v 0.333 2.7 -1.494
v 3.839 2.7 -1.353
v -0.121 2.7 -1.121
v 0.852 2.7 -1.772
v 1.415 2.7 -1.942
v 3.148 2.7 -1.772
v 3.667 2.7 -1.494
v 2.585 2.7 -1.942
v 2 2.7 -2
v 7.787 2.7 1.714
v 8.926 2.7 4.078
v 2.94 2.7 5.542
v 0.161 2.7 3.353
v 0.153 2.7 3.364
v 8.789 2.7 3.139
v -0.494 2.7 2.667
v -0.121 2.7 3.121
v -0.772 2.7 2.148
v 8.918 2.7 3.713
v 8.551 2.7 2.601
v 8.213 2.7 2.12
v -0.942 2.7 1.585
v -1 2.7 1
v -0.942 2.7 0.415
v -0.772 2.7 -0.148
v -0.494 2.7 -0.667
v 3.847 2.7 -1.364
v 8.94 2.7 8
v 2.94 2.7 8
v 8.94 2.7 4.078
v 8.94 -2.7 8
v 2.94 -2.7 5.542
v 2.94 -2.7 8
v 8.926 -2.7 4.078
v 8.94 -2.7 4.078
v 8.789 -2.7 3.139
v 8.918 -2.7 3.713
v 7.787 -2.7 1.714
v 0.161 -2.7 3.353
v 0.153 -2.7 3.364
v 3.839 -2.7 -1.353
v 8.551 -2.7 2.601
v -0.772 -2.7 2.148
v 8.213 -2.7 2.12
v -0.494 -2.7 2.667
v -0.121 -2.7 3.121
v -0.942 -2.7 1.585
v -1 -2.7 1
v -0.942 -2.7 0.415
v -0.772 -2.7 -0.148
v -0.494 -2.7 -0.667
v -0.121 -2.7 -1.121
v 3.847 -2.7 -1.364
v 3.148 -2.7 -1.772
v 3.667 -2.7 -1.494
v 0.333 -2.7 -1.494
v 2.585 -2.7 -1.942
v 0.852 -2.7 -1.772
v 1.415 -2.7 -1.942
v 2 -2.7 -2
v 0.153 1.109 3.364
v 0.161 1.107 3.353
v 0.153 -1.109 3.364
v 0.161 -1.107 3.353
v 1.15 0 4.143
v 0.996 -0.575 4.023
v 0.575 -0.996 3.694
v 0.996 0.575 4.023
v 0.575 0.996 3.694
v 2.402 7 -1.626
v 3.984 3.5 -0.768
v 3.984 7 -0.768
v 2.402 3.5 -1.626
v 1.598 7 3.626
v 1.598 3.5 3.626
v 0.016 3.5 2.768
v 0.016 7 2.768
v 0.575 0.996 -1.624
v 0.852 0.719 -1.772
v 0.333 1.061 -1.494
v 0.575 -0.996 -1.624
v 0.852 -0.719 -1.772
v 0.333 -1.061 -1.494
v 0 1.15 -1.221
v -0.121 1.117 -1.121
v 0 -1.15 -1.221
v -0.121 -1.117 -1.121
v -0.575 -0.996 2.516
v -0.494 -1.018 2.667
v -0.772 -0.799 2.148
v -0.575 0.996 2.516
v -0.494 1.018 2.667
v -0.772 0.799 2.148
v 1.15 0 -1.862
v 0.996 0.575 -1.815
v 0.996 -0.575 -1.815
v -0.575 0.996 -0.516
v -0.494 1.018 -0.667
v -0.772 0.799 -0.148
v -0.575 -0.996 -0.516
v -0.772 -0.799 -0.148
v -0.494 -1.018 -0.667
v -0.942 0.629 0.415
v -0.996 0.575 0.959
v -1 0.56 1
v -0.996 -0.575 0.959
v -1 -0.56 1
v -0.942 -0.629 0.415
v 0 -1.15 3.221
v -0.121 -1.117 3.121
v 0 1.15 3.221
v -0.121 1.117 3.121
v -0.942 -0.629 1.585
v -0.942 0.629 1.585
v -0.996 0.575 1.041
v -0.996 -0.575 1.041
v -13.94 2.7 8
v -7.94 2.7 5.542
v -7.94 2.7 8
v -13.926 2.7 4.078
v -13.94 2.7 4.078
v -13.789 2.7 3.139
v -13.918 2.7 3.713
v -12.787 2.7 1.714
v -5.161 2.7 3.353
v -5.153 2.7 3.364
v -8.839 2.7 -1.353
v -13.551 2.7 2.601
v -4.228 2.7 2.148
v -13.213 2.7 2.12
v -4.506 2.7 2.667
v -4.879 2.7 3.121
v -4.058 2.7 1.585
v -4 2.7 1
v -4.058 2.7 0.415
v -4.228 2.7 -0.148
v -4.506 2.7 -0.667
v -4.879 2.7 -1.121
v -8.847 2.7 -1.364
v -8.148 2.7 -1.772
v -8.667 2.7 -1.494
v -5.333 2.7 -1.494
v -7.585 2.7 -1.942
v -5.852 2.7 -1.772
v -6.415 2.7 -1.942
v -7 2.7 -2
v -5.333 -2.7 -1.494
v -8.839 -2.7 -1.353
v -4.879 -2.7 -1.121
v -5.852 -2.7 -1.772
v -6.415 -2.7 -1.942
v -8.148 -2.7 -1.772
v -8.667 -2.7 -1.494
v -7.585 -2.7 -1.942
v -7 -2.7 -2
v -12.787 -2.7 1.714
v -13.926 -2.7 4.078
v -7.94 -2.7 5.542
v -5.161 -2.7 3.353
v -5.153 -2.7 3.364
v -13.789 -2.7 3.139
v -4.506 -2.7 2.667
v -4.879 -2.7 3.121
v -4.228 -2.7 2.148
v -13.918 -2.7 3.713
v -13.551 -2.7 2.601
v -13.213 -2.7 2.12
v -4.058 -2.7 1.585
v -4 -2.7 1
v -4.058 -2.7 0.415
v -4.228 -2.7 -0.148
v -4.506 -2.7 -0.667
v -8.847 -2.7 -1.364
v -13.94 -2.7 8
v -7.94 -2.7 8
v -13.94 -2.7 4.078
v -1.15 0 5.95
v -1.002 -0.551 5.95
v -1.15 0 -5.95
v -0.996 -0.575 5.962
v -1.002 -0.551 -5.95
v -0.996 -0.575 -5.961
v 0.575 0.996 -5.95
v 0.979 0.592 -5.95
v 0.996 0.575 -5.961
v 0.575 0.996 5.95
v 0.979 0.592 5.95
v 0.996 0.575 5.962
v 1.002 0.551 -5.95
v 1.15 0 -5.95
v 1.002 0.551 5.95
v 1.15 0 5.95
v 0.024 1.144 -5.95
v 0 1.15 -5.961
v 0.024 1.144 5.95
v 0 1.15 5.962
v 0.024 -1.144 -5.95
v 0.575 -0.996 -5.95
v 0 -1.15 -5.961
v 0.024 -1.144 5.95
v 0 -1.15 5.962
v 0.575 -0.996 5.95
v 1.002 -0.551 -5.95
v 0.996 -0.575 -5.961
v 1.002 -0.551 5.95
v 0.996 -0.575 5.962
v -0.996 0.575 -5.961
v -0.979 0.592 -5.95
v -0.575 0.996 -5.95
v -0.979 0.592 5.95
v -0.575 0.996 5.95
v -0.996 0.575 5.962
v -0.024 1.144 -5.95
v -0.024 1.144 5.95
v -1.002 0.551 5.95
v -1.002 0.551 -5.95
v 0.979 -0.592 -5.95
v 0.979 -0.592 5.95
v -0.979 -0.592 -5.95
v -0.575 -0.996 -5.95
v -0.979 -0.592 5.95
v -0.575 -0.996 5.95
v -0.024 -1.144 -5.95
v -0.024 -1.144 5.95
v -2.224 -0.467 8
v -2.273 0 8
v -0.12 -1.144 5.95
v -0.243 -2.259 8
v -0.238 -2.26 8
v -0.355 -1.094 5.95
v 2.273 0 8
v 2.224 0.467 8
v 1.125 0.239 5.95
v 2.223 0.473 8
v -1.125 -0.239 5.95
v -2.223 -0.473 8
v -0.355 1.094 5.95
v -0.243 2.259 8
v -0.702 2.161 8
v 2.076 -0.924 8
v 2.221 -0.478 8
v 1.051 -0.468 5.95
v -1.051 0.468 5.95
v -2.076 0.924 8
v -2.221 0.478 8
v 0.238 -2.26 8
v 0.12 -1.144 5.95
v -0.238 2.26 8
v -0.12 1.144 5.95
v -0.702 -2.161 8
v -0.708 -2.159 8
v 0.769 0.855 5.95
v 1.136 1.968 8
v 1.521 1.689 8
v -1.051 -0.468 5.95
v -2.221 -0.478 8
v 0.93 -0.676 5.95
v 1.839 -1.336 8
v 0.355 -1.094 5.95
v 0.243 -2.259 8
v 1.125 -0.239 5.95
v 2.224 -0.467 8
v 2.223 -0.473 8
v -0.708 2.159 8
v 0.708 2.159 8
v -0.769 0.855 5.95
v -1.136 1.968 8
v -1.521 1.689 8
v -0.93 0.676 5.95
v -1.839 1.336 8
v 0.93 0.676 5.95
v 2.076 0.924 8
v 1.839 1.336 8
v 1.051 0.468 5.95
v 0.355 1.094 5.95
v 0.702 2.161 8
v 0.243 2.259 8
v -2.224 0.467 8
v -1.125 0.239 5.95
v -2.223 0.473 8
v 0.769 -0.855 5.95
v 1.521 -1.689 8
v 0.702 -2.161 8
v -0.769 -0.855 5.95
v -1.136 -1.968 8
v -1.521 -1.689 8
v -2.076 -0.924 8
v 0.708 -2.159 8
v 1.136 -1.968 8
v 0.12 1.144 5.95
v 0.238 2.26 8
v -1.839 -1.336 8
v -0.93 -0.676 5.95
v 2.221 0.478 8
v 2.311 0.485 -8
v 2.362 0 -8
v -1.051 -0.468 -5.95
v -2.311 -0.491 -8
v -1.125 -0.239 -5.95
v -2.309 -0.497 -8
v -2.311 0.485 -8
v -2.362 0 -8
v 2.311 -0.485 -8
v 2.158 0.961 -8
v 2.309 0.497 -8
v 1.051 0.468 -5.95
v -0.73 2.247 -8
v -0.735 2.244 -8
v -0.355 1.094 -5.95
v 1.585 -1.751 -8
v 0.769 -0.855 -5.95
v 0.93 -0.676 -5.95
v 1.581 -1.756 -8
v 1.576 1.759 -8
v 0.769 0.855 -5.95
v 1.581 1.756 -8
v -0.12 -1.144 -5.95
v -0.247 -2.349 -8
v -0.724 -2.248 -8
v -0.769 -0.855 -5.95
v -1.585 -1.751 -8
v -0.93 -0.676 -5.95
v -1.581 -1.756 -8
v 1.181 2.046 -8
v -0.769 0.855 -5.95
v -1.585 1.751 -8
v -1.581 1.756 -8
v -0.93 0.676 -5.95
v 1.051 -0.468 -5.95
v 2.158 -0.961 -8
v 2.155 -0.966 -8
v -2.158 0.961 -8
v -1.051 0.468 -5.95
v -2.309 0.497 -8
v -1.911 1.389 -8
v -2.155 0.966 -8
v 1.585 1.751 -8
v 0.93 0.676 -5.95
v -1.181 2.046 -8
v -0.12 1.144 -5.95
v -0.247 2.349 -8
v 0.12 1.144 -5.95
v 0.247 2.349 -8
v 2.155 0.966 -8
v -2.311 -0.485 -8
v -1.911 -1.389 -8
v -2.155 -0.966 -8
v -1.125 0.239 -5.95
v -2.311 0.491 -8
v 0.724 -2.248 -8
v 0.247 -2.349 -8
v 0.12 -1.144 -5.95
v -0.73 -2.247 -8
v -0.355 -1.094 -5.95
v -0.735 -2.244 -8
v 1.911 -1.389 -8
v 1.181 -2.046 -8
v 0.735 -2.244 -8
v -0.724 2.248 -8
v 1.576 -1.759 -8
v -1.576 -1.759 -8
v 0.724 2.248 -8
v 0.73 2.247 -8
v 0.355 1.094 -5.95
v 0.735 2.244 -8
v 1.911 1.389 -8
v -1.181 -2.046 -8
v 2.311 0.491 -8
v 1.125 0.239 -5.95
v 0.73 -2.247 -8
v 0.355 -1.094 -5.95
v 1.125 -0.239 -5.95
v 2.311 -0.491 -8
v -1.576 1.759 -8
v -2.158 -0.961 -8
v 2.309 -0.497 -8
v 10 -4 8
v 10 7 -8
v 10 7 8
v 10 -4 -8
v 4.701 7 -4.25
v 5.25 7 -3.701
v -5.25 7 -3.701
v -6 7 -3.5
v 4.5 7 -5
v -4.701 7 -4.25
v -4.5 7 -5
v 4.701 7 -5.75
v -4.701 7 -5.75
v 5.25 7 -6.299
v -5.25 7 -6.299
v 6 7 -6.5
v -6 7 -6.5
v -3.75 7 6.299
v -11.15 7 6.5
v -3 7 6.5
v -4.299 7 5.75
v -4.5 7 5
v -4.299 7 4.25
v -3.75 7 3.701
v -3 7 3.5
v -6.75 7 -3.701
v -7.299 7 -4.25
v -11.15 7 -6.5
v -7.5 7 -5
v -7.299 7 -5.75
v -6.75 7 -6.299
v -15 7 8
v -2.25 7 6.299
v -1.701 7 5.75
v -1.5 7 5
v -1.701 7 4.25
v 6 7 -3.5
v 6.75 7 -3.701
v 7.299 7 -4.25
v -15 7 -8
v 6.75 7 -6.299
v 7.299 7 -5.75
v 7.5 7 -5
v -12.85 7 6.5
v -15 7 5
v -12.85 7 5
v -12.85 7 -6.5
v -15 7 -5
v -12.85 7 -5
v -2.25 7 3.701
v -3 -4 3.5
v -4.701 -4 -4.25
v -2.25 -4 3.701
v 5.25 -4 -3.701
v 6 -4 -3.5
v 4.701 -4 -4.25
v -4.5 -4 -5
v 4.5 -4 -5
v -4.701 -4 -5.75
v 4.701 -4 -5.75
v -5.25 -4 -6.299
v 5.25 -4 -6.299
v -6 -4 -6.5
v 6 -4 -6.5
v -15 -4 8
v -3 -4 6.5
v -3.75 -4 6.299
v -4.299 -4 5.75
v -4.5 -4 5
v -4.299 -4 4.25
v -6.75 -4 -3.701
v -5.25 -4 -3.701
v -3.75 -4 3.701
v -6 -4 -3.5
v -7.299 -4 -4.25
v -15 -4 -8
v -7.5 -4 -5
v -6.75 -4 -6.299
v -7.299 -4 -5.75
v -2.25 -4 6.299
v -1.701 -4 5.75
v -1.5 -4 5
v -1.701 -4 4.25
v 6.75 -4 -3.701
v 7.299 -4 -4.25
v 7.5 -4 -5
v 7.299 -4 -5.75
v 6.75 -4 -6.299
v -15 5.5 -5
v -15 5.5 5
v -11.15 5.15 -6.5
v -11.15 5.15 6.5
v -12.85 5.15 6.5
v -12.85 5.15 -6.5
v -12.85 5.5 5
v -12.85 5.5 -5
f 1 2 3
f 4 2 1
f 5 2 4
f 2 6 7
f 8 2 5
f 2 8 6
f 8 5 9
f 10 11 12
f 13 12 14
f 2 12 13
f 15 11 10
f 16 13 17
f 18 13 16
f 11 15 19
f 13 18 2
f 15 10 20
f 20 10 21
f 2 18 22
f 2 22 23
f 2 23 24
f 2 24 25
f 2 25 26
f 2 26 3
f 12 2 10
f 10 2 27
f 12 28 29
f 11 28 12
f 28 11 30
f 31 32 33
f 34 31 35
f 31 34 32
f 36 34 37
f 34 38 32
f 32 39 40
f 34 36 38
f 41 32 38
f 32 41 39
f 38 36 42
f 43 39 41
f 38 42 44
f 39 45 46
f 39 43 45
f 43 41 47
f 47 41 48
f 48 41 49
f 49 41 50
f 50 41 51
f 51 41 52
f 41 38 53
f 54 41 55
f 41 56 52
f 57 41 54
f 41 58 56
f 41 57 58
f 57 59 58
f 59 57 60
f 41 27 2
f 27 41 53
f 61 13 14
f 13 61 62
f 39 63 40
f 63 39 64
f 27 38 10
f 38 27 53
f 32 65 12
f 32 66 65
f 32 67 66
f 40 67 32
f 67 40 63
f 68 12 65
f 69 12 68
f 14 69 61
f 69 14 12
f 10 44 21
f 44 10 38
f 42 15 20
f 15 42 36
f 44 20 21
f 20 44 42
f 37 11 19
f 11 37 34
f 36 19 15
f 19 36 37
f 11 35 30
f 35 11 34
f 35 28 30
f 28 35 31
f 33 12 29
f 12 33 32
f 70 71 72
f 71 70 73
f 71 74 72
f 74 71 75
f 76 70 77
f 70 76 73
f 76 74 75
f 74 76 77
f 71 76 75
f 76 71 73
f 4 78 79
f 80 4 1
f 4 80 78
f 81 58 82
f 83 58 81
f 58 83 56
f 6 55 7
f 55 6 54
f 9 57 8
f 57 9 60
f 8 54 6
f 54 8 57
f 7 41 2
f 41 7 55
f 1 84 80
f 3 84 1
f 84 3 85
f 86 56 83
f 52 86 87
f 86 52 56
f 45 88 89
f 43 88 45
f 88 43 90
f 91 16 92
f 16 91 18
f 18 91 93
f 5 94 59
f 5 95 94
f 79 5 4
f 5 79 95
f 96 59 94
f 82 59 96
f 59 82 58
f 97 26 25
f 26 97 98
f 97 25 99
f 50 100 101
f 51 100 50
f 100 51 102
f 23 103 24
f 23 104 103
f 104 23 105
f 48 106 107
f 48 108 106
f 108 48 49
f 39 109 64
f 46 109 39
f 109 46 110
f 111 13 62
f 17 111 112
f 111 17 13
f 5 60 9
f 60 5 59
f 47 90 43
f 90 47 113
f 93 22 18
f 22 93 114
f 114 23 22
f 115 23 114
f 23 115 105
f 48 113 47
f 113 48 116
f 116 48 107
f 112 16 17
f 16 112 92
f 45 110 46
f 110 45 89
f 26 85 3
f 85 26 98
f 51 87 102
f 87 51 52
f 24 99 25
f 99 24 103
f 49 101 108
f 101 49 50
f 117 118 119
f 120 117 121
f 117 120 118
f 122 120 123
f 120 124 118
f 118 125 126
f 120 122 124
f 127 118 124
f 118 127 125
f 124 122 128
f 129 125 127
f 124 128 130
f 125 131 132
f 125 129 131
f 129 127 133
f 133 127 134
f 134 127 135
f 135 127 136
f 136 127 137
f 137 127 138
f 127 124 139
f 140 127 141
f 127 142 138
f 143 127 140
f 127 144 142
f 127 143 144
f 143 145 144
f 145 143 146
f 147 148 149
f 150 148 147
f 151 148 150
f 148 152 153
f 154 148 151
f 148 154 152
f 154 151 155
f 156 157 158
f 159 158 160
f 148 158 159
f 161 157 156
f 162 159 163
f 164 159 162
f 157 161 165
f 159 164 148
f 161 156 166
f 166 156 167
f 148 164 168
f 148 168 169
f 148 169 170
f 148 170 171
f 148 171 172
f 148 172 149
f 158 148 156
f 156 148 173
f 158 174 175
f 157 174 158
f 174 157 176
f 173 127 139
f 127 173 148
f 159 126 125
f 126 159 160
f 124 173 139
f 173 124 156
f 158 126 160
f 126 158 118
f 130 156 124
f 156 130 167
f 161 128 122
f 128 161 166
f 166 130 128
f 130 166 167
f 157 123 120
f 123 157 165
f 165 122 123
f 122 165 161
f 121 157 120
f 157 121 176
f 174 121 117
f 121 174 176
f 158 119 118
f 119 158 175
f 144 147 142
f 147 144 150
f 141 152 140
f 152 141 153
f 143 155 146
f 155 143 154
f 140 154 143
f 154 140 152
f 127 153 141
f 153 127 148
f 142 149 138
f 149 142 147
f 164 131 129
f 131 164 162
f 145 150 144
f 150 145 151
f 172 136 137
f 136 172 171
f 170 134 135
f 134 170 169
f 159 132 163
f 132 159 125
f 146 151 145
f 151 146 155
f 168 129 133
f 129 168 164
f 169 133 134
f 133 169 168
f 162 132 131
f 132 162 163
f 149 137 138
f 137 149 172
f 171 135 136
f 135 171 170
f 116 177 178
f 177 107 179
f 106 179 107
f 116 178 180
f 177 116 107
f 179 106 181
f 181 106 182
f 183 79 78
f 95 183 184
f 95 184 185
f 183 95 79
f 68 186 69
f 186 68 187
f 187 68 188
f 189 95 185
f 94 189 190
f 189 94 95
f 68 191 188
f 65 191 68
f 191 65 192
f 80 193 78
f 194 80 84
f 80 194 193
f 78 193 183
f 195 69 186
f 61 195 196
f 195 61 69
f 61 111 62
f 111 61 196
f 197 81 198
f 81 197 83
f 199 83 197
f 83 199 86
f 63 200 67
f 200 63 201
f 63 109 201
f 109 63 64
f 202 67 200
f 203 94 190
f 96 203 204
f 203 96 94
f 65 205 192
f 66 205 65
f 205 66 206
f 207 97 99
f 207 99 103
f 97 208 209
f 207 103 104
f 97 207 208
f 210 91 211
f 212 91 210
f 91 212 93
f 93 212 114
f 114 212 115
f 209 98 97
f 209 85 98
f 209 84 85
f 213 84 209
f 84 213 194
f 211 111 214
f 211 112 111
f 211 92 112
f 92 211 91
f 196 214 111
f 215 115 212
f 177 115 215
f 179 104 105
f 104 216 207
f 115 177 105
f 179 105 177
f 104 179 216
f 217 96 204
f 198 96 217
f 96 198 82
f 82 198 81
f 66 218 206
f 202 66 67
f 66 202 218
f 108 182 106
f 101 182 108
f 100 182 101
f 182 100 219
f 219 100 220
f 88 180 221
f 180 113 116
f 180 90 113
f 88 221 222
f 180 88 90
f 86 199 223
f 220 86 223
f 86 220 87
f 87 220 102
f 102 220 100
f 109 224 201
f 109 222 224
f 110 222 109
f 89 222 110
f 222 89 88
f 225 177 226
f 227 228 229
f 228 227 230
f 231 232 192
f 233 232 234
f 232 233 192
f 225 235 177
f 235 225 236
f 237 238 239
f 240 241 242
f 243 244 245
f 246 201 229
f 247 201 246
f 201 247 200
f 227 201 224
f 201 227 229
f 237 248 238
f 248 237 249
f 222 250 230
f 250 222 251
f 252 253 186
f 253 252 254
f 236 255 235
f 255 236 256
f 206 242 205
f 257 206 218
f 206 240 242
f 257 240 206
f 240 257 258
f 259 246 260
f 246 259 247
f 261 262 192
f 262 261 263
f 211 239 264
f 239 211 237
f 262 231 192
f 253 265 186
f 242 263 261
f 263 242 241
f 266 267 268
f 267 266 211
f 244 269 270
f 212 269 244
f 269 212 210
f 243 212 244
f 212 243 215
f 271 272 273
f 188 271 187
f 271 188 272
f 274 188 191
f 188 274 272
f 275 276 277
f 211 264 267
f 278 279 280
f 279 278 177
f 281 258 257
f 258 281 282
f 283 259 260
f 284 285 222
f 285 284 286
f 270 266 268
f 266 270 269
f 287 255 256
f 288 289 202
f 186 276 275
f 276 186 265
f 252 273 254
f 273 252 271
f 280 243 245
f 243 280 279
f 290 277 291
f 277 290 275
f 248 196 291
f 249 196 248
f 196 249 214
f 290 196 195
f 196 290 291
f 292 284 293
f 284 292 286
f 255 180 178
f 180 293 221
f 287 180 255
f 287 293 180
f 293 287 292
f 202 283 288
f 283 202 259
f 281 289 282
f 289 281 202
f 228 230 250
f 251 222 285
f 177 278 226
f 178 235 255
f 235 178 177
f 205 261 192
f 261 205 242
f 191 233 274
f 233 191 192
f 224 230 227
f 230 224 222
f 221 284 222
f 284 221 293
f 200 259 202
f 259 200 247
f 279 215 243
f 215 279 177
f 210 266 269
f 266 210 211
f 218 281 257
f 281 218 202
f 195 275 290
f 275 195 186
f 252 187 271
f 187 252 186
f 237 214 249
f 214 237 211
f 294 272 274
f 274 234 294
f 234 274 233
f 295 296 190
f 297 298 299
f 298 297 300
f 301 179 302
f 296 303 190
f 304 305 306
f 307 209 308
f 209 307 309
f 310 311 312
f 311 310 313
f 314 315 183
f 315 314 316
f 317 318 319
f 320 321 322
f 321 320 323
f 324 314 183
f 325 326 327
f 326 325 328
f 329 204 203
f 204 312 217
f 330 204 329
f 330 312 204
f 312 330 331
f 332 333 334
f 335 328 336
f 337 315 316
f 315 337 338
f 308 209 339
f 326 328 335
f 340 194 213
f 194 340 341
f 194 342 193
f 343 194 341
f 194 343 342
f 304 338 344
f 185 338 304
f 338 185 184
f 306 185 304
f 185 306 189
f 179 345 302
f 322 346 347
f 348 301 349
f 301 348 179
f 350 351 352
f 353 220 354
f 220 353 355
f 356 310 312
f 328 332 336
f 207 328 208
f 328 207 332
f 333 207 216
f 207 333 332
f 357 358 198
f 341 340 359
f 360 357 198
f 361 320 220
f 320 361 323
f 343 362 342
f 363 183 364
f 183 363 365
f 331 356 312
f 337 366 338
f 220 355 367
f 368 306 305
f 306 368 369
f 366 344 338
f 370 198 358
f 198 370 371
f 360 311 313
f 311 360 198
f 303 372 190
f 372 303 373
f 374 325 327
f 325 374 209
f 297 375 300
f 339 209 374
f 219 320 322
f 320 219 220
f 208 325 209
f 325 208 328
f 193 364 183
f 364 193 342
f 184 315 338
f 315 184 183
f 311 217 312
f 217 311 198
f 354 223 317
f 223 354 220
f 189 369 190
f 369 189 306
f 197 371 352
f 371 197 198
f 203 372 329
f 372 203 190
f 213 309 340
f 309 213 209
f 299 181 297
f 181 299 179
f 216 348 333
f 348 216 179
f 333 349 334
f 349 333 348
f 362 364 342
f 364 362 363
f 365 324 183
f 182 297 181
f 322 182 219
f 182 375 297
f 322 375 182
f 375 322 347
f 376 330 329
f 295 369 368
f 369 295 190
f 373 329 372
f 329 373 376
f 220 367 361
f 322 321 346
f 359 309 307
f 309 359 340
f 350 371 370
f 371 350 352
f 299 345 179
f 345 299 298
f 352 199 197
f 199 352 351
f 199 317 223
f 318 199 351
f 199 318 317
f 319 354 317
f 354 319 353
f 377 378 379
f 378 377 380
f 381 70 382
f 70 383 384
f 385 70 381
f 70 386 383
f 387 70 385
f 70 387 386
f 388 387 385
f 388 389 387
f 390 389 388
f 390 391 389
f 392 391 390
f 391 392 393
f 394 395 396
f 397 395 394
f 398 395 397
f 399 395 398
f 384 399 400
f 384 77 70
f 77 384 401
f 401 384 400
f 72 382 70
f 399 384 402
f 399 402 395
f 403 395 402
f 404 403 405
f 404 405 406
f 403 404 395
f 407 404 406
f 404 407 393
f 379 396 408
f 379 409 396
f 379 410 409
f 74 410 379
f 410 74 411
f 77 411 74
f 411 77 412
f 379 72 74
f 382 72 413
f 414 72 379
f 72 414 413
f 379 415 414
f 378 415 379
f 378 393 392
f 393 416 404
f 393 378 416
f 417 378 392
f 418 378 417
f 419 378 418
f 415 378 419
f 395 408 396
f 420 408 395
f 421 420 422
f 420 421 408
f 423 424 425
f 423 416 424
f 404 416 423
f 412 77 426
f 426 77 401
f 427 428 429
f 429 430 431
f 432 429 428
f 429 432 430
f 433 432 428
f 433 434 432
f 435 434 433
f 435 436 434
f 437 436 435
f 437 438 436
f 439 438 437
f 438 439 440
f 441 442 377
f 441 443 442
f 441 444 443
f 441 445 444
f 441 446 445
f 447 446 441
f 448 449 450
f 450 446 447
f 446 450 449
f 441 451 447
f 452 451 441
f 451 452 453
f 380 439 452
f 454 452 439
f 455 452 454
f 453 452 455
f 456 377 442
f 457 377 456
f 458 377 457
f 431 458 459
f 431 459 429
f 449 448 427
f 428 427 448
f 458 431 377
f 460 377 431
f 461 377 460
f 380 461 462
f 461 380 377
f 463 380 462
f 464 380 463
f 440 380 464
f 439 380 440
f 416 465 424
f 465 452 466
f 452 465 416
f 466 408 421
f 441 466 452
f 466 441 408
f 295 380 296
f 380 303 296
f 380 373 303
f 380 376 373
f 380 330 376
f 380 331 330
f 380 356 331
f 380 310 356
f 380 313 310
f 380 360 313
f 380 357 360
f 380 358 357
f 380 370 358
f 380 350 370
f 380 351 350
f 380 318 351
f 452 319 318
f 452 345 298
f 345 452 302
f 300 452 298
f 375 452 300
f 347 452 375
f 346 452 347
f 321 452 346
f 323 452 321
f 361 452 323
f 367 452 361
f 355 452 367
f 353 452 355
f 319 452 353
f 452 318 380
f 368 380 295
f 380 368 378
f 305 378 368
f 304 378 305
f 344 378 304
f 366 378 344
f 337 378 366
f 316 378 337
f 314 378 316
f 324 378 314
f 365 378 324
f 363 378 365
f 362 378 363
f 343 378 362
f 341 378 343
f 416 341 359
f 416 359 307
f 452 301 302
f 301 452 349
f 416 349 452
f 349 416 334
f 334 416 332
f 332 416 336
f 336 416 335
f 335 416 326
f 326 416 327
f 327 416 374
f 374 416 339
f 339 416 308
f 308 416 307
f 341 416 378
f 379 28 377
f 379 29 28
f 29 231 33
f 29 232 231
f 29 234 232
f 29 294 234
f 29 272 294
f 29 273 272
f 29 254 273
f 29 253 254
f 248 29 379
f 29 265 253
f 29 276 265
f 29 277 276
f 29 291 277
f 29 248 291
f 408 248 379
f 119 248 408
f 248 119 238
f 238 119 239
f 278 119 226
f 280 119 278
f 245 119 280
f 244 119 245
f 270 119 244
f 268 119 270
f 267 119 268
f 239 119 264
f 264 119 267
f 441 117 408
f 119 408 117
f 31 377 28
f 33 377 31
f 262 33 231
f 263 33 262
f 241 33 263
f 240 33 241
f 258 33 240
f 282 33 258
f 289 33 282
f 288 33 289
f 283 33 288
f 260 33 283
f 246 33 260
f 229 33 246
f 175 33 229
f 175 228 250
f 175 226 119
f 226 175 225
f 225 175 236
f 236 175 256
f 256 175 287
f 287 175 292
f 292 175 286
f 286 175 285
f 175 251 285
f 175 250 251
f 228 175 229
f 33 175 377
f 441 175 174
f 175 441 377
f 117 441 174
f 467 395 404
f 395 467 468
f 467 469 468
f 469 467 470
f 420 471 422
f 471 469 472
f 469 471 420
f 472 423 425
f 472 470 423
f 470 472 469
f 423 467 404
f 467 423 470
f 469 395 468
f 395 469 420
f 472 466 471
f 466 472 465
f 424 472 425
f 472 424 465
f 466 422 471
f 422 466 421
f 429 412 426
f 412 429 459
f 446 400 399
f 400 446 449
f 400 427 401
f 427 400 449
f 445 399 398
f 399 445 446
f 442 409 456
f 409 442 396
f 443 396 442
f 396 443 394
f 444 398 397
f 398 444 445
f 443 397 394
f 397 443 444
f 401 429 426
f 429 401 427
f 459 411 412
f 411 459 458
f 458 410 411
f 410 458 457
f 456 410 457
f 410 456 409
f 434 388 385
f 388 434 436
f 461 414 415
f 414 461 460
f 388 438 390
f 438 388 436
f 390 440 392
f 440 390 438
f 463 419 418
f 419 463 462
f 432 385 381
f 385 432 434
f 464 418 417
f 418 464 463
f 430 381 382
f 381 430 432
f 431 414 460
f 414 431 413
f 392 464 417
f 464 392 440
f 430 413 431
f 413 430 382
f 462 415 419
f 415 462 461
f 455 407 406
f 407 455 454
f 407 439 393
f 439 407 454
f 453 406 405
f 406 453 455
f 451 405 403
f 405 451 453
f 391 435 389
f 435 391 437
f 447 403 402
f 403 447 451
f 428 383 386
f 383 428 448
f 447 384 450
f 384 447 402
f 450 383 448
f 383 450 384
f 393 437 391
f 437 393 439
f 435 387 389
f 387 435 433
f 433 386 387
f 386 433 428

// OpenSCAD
// filament sensor with magnet and HALL sensor

// prusa has this logic in its original IR filament sensor
// sensor OUT:
// 0 (LOW)  LOADED
// 1 (HIGH) EMPTY
// IR sensor pinout
// +  +5V
// O  OUT
// -  GND

// MK2S rambo13a 10-pin connector looking at PCB pins
// ---------
// x x x x x
// x s x - +
// ---------
//    P3
// -=GND, +=+5V, s=signal

// MK3 einsy10a 10-pin connector looking at PCB pins
// ---   ---
// x x x x x
// s x x - +
// ---------
// -=GND, +=+5V, s=signal

// HALL sensor Honeywell SS495A, on package is written 95A
// pinout looking at pins, plastic case at the back
//   _______
//  / + - o \
//  ---------

// connect
//  - -
//  + +
//  s o

// Prusa MK2.5S firmware can be loaded to MK2S
// Support -> Sensor info
// Fil. sensor: 1-LOADED, 0-EMPTY

hall_pos = [0.0,0,6]; // in case of false filament runout, decrease X in steps of 0.1

hall_sensor_dim = [5,5,1.8];
//hall_sensor_dim = [4.06, 3.0, 1.6]; // Honeywell SS495A package, with enlarge factor for hole
filament_hole_d = 2.3; // 1.75mm should freely passthru

// the filament sensor cube dim
guide_dim=[25,16,8+3]; // reduce Z to see cross-section
guide_pos=[-2.5,0,1.5];

magnet2_pos = [-5,0,0]; // adjust X to tune force

connector_pcb_cube=[1.7,13,7.7];
connector_pcb_pos=[-12,0,9];


mounting_holes=[[-3,-5],[6,5],[-6,5]];

module hall_sensor()
{
  cube(hall_sensor_dim, center=true);
}

module magnet()
{
  cylinder(d=magnet_dim[0], h=magnet_dim[1], $fn=24, center=true);
}


module filament()
{
  translate([0,0,0])
    rotate([90,0,0])
    cylinder(d=1.75,h=70,$fn=12,center=true);
}

module roller_cutter(have_sensor=1)
{
  roller_pos = [2.0,-1,0];
  roller_dim = [6.0,5.4]; // DxH
  channel_angle = 38; // fall down angle
  channel_dim = [5,roller_dim[0],roller_dim[1]]; // from center of roller, at fall down angle
  top_insert_dim = [10,roller_dim[0]+0,roller_dim[1]];
  // roller cut
  translate(roller_pos)
  cylinder(d=roller_dim[0],h=roller_dim[1],$fn=32,center=true);
  // angular
  translate(roller_pos)
  rotate([0,0,-channel_angle])
  {
    // channel
    translate([channel_dim[0]/2,0,0])
    cube(channel_dim,center=true);
    // circular knee transition to upwards channel
    translate([channel_dim[0],0,0])
      cylinder(d=top_insert_dim[1],h=roller_dim[1],$fn=32,center=true);
    // cut upwards channel to insert magnet
    translate([channel_dim[0],0,0])
    rotate([0,0,-90+channel_angle])
    translate([top_insert_dim[0]/2,0,0])
    cube(top_insert_dim,center=true);
    // cut for sensor
    if(have_sensor>0.5)
    translate(hall_pos)
      //rotate([0,0,channel_angle])
      rotate([90,0,90+channel_angle/4])
      cube(hall_sensor_dim,center=true);
  }
}


module filament_guide()
{
  difference()
  {
    union()
    {
      // guide block
      translate(guide_pos)
        cube(guide_dim,center=true);
    }
    // main roller hole and sensor
    roller_cutter();
    // additional magnet to increase force
    translate(magnet2_pos) // more X distance less force
      scale([-1,1,1]) // mirror
        roller_cutter(have_sensor=0);
    // filament hole thru all
    rotate([90,0,0])
    {
      cylinder(d=filament_hole_d,h=50,$fn=12,center=true);
      // overhang fix
      if(0)
      translate([0.4,0,0])
        cylinder(d=filament_hole_d*0.8,h=50,$fn=12,center=true);
      // conical lead-in
      translate([0,0,-guide_pos[1]+2+guide_dim[1]/2-11+8])
        cylinder(d1=filament_hole_d,d2=filament_hole_d*2,h=2.1,$fn=30,center=true);
      // conical lead-out
      if(1)
      translate([0,0,-guide_pos[1]+2-guide_dim[1]/2+11-12])
        cylinder(d2=filament_hole_d,d1=filament_hole_d*2.08,h=2.1,$fn=30,center=true);
    }
  }
}

module holder_bars()
{
  // filament entry side
  holder_pos = guide_pos + [0,0,9];
  holder_dim = guide_dim - [0,0,4];
  holder_thick = 2;
  holder_backplate_thick = 1;
  translate(holder_pos)
    difference()
    {
      cube(holder_dim,center=true);
      translate([0,0,-holder_backplate_thick/2-0.01])
      cube(holder_dim+[-holder_thick*2,-holder_thick*3,-holder_backplate_thick],center=true);
    }
}

module baseplate()
{
    translate([10,2,-1.5-6/2])
      cube([25,22,3],center=true);
}

module screw_holes(d=3, h=30)
{
  // mounting holes
  for(i=[0,1,2])
      translate(mounting_holes[i])
        rotate([0,0,90])
          cylinder(d=d,h=h,$fn=12,center=true);
}

module connector_pcb()
{
  translate(connector_pcb_pos)
  cube(connector_pcb_cube,center=true);
  // connector front cut
  translate(connector_pcb_pos+[-2,0,0])
    cube([5,10,7],center=true);
}

// mounting spacer with connector cut and screw holes
module spacer()
{
   difference()
   {
     union()
     {
       holder_bars();
       translate([0,0,10.5])
       screw_holes(d=4,h=7);
     }
     screw_holes(d=1.8);
     translate([0,0,0.2])
     connector_pcb();
   }
}

cableorg_holes_pos = [[0,32], [0,22]];
module cableorg_holes(d=1.8)
{
    // holes for cable organizer
    for(i=[0,1])
    translate(cableorg_holes_pos[i])
      rotate([0,0,0])
        cylinder(d=d,h=20,$fn=12,center=true);
}

module pendulum()
{
  // for M8 rod
  pendulum_dim = [7,40,7];
  pendulum_pos = [0,28,1.5];
  ring_inner_d =  9;
  ring_outer_d = 15;

  // for printed holder old design
  /*
  pendulum_dim = [7,40,5];
  pendulum_pos = [0,28,0.5];
  ring_inner_d = 10;
  ring_outer_d = 15;
  */

  difference()
  {
    union()
    {
      translate(pendulum_pos)
        cube(pendulum_dim, center=true);
      translate(pendulum_pos+[0,pendulum_dim[1]/2,0])
        cylinder(d=ring_outer_d,h=pendulum_dim[2],$fn=32,center=true);
    }
    // hole for bearing
    translate(pendulum_pos+[0,pendulum_dim[1]/2,0])
        cylinder(d=ring_inner_d,h=pendulum_dim[2]+1,$fn=32,center=true);
    cableorg_holes();
  }
}

module cable_cover()
{
  difference()
  {
    translate([0,27,5])
    cube([7,15,3],center=true);
    translate([0,27,4])
    cube([8,6,1.01],center=true);
    cableorg_holes(d=3);
  }
}

module pendulum_holder_screw_holes()
{
  mounting_holes=[[10,10,0],[-10,-10,0]];
     // mounting holes
  for(i=[0,1])
      translate(mounting_holes[i])
        rotate([0,0,90])
        {
          cylinder(d=1.8,h=20,$fn=12,center=true);
          // hole for sunken head
          if(0)
          translate([0,0,5])
          cylinder(d=6,h=10,$fn=12,center=true);
        }
}

module pendulum_holder()
{
  plate_box = [25,30,4];
  axis_pos = [0,-3,0];
  axis = [8,6]; // d,h
  difference()
  {
    cube(plate_box,center=true);
    pendulum_holder_screw_holes();
  }
  // axis
  translate(axis_pos+[0,0,plate_box[2]/2+axis[1]/2])
  difference()
  {
    cylinder(d=axis[0],h=axis[1],$fn=32,center=true);
    // screw hole
    cylinder(d=1.8,h=axis[1]+1,$fn=32,center=true);
  }
  // filament holder
  if(1)
  translate([0,12,7])
    cube([5,6,10],center=true);
  // circular holder
  translate([0,12,30])
    rotate([90,90,0])
    difference()
    {
      cylinder(d=40,h=6,$fn=6,center=true);
      cylinder(d=30,h=11,$fn=6,center=true);
    }
}

module holder_disc()
{
  difference()
  {
    cylinder(d=15,h=2,$fn=32,center=true);
    cylinder(d=3,h=3,$fn=32,center=true);
  }
}

// sensor
if(1)
rotate([-90,0,0])
{
%filament();
%connector_pcb();
difference()
{
  union()
  {
    filament_guide();
    //holder_bars();
  }
  connector_pcb();
  screw_holes();
}
%spacer();
}

// pendulum with backplate
if(0)
{
  translate([0,0,12])
  rotate([180,0,0])
  spacer();
  pendulum();
}

// pendulum holder to be screwd on snap-on adapter
if(0)
{
  pendulum_holder();
}

// disc on top of the holder
if(0)
  holder_disc();

// spacer disk for too long screws
if(0)
  difference()
  {
    cylinder(d=6.0,h=1.5,$fn=12,center=true);
    cylinder(d=2.5,h=2.0,$fn=12,center=true);
  }

if(0)
  cable_cover();
